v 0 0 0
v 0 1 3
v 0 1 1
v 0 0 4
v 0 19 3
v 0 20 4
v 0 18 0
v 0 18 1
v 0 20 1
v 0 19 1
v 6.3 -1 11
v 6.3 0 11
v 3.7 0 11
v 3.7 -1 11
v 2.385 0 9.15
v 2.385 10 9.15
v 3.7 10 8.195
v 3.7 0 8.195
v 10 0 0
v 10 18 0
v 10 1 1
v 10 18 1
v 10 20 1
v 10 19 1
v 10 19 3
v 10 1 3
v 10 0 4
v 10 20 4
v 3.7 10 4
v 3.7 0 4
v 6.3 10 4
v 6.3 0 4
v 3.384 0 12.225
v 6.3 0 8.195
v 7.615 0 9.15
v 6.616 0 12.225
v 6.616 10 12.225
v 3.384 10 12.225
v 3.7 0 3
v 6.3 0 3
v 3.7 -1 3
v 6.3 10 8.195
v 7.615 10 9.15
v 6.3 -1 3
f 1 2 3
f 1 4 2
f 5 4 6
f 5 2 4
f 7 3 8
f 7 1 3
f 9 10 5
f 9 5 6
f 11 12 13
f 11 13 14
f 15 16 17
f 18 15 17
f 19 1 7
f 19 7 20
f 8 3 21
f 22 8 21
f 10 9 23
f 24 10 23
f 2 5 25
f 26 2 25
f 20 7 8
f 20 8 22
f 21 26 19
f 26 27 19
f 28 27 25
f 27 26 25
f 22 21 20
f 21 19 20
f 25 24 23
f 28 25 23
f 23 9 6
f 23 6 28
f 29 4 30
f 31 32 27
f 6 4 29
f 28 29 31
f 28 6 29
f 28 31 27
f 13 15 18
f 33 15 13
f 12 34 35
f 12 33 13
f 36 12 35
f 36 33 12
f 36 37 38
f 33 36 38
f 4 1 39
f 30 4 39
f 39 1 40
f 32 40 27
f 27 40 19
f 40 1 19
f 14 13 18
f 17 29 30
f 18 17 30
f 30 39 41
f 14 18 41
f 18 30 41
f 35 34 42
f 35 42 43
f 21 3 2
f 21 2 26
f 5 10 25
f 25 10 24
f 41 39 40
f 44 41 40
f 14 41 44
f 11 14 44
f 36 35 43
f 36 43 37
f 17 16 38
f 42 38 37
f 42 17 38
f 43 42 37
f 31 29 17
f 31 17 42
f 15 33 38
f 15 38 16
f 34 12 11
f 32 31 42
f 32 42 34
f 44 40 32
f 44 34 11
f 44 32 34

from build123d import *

# Parameters (mm, degrees)
BOX001_W                   = 10
BOX001_H                   = 20
BOX001_DEPTH               = 1
BOX004_W                   = 11
BOX004_H                   = 2.6
BOX004_DEPTH               = 8
EXTRUDE003_DEPTH           = 10
EXTRUDE003_PLACEMENT_ANGLE = 90
FUSION003_PLACEMENT_ANGLE  = 270
BOX003_W                   = 10
BOX003_H                   = 1
BOX003_DEPTH               = 4
BOX_W                      = 10
BOX_H                      = 18
BOX_DEPTH                  = 1
BOX002_W                   = 10
BOX002_H                   = 1
BOX002_DEPTH               = 2


with BuildPart() as cube001:
    # Box001 → Box001 (new body)
    with BuildSketch(Plane.XY.offset(3)):
        with Locations((5, 10)):
            Rectangle(BOX001_W, BOX001_H)
    extrude(amount=BOX001_DEPTH)


with BuildPart() as cube004:
    # Box004 → Box004 (new body)
    with BuildSketch(Plane(origin=(0, 5.7, -4), x_dir=(1, 0, 0), z_dir=(0, 0, 1))):
        with Locations((5.5, 1.3)):
            Rectangle(BOX004_W, BOX004_H)
    extrude(amount=BOX004_DEPTH)


with BuildPart() as keymaster:
    # RegularPolygon003 → Extrude003 (new body)
    with BuildSketch(Plane(origin=(-2.737398, 7, 0), x_dir=(0, 1, 0), z_dir=(0, 0, 1))):
        Polygon((0, -2.487398), (2.615405, -0.587195), (1.616409, 2.487398), (-1.616409, 2.487398), (-2.615405, -0.587195), align=None)
    extrude(amount=EXTRUDE003_DEPTH)


with BuildPart() as keymaster_1:
    # Extrude003 placement: moved
    add(keymaster.part.rotate(Axis((0, 0, 0), (0, 1, 0)), EXTRUDE003_PLACEMENT_ANGLE))

    # Fusion003: union Cube004
    add(cube004.part)


with BuildPart() as keymaster_2:
    # Fusion003 placement: moved
    add(keymaster_1.part.moved(Location((-2, 10, 7))).rotate(Axis((-2, 10, 7), (0, 0, 1)), FUSION003_PLACEMENT_ANGLE))


with BuildPart() as cube003:
    # Box003 → Box003 (new body)
    with BuildSketch(Plane.XY):
        with Locations((5, 0.5)):
            Rectangle(BOX003_W, BOX003_H)
    extrude(amount=BOX003_DEPTH)


with BuildPart() as cube:
    # Box → Box (new body)
    with BuildSketch(Plane.XY):
        with Locations((5, 9)):
            Rectangle(BOX_W, BOX_H)
    extrude(amount=BOX_DEPTH)


with BuildPart() as fusion:
    # Box002 → Box002 (new body)
    with BuildSketch(Plane(origin=(0, 19, 1), x_dir=(1, 0, 0), z_dir=(0, 0, 1))):
        with Locations((5, 0.5)):
            Rectangle(BOX002_W, BOX002_H)
    extrude(amount=BOX002_DEPTH)

    # Fusion: union Cube001, keymaster, Cube003, Cube
    add(cube001.part)
    add(keymaster_2.part)
    add(cube003.part)
    add(cube.part)


solid = fusion.part
